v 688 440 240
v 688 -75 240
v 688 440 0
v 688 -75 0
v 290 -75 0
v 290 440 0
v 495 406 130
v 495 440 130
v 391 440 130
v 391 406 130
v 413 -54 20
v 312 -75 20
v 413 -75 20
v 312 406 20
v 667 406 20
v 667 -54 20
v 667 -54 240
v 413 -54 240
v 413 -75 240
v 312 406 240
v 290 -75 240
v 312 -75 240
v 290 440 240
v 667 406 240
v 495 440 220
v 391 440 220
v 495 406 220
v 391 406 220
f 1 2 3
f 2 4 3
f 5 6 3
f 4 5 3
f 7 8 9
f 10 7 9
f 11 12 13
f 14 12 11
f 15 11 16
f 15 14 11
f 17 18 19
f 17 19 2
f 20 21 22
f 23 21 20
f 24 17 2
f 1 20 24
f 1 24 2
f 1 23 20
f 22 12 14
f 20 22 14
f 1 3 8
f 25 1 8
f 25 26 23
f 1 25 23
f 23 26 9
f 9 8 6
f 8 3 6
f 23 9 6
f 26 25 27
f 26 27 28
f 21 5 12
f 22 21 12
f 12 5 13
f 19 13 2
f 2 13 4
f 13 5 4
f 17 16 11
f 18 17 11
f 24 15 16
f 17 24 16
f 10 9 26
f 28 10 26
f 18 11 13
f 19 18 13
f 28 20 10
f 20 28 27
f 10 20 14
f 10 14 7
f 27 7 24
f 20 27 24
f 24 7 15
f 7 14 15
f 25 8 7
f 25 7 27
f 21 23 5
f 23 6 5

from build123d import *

# Parameters (mm, degrees)
F2_DEPTH = 20
F4_DEPTH = 220
F5_W     = 104
F5_H     = 90
F6_DEPTH = 40


with BuildPart() as f2:
    # F1 (on face) → F2 (new body)
    with BuildSketch(Plane.XY):
        Polygon((413, -75), (688, -75), (688, 440), (290, 440), (290, 406), (290, 141), (290, -75), align=None)
    extrude(amount=F2_DEPTH)

    # F3 (on face) → F4 (join)
    with BuildSketch(Plane.XY.offset(20)):
        Polygon((667, 406), (667, -54), (413, -54), (413, -75), (688, -75), (688, 406), (688, 440), (290, 440), (290, -75), (312, -75), (312, 43), (312, 124), (312, 406), align=None)
    extrude(amount=F4_DEPTH)

    # F5 (on face) → F6 (cut)
    with BuildSketch(Plane(origin=(0, 440, 0), x_dir=(-1, 0, 0), z_dir=(0, 1, 0))):
        with Locations((-443, 175)):
            Rectangle(F5_W, F5_H)
    extrude(amount=-F6_DEPTH, mode=Mode.SUBTRACT)


solid = f2.part
